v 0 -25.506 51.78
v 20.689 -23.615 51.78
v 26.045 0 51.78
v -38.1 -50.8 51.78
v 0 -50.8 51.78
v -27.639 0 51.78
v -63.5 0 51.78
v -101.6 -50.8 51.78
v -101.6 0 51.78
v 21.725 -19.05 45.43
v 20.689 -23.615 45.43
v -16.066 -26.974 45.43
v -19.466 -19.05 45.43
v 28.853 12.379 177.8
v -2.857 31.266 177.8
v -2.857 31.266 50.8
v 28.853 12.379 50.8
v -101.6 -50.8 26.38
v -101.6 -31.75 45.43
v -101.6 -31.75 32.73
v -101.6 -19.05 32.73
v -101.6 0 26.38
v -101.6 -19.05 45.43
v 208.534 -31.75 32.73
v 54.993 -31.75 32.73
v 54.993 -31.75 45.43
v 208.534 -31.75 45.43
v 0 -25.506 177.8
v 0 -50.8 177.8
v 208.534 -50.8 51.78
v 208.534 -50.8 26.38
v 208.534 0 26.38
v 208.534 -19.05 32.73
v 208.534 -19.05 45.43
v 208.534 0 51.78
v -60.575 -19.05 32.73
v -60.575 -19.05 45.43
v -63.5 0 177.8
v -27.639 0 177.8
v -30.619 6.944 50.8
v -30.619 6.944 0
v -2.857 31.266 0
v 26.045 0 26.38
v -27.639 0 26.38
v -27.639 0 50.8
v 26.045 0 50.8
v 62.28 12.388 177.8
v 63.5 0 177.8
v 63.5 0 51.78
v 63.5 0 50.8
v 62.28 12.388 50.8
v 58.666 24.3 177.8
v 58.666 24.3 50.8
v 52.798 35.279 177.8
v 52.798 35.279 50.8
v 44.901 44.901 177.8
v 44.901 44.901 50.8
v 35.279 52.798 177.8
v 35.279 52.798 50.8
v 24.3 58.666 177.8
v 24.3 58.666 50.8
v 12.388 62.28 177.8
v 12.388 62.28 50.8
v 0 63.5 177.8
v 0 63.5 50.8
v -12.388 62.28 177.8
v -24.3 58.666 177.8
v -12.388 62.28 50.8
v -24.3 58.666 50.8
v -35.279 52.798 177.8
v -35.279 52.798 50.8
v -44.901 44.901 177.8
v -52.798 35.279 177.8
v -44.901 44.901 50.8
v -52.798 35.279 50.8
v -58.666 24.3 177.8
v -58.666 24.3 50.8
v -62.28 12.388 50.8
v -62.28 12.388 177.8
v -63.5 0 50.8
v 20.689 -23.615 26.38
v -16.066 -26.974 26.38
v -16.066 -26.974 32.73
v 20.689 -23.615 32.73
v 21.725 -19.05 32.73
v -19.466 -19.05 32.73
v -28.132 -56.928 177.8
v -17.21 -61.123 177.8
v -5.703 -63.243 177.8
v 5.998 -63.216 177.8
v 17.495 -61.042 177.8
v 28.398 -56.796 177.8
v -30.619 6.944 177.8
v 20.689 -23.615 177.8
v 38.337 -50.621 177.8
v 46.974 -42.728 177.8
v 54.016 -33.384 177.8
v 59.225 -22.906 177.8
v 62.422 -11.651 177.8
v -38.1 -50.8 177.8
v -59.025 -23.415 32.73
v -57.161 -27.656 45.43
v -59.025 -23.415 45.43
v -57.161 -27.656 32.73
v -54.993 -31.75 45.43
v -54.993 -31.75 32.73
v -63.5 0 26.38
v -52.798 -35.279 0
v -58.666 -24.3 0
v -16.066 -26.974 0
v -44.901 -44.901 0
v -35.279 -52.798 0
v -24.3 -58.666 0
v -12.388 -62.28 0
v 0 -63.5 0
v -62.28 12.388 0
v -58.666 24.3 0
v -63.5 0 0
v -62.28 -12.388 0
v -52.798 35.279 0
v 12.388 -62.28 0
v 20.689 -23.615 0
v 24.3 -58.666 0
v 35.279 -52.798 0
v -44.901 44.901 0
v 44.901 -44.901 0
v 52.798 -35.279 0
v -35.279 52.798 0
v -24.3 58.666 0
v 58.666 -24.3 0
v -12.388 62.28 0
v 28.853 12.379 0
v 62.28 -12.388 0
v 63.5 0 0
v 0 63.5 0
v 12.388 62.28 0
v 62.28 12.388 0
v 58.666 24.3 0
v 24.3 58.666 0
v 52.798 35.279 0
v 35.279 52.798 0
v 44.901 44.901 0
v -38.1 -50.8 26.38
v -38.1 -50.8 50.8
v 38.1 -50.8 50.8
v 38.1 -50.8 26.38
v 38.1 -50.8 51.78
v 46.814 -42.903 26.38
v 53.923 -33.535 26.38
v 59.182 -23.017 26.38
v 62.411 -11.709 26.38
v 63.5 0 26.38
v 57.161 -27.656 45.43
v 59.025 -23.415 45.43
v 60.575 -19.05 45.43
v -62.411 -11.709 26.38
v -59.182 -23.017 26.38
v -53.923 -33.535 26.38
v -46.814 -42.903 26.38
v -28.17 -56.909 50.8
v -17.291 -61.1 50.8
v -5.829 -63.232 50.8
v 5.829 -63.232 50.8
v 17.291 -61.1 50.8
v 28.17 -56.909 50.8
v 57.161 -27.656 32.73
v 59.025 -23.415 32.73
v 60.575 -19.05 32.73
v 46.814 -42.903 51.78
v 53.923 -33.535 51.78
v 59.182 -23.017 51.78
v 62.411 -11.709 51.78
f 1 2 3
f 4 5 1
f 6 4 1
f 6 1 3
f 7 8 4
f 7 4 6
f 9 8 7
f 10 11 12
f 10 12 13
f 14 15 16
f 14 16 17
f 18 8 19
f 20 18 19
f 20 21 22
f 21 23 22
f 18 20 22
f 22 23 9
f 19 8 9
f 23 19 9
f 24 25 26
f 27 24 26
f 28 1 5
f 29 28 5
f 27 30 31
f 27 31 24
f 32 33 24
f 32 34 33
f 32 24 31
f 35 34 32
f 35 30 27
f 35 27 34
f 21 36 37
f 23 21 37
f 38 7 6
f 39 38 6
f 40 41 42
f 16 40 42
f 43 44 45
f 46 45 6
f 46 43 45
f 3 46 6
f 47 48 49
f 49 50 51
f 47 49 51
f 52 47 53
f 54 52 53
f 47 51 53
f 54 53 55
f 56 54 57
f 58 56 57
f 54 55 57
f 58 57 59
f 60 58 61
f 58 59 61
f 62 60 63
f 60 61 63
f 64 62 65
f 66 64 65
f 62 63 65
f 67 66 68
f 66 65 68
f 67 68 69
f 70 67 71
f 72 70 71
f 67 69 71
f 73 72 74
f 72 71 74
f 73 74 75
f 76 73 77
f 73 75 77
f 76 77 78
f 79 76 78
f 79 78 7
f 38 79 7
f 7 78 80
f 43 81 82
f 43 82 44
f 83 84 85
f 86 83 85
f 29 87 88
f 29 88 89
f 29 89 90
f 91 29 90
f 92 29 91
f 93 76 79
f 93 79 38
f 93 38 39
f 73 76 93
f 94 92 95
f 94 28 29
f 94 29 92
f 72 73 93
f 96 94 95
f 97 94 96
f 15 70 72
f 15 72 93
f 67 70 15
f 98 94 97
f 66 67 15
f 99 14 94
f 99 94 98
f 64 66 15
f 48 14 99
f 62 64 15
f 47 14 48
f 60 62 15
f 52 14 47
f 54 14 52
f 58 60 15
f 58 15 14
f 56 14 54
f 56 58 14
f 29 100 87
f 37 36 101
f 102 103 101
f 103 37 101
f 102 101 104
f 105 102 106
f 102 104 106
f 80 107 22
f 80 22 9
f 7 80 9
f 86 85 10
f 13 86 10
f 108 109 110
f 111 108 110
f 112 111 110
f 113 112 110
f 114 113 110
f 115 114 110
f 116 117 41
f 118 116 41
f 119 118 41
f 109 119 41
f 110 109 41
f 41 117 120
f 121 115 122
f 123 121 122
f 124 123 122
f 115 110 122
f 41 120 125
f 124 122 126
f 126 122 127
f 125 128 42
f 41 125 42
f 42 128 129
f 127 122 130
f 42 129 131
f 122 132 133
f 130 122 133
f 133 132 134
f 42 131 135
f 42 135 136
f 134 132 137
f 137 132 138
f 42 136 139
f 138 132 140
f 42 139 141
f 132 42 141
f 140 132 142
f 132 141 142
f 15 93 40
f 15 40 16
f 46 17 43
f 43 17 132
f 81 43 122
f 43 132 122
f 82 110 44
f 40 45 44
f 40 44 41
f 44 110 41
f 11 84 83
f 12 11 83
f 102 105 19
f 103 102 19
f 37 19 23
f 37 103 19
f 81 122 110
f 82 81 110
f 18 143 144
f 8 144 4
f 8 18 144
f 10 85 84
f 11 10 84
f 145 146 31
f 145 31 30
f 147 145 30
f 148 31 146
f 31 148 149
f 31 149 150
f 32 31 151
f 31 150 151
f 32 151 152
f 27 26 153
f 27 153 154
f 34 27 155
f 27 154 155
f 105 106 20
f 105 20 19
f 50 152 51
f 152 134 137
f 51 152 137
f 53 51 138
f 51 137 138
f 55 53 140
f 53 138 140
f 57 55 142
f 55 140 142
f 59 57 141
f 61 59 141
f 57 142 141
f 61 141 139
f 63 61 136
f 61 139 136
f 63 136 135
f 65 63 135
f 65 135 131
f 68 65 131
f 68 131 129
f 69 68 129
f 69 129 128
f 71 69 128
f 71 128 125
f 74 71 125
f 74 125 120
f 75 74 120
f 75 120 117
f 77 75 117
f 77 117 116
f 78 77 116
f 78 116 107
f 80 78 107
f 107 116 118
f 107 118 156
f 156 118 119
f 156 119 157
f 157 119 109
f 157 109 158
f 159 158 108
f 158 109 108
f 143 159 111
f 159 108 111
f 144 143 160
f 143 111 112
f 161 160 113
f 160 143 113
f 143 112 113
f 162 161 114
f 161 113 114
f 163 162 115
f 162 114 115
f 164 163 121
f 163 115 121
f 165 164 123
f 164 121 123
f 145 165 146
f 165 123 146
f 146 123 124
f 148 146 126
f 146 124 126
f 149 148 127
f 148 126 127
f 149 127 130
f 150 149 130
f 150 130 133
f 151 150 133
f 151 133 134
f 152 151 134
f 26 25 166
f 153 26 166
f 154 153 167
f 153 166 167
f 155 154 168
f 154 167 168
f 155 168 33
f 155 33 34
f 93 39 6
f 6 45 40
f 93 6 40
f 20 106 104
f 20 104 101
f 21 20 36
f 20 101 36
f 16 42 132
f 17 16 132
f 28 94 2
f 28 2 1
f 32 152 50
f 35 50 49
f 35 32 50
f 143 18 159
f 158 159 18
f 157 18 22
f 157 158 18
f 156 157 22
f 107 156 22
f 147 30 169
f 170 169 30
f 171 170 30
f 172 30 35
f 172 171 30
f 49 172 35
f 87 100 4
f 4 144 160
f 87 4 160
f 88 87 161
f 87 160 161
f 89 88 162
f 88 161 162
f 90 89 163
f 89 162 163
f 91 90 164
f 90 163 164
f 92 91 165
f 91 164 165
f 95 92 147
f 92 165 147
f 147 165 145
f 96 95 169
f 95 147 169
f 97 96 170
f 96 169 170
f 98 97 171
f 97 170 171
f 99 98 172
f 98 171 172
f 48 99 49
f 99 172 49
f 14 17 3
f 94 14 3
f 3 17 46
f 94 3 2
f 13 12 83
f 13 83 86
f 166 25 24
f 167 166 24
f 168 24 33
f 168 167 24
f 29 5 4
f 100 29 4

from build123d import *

# Parameters (mm, degrees)
F0_R     = 63.5
F1_DEPTH = 50.8
F2_W     = 50.8
F2_H     = 25.4
F2_W_2   = 12.7
F2_H_2   = 12.7
F3_DEPTH = 101.6
F5_DEPTH = 208.534
F6_DEPTH = 127


with BuildPart() as f1:
    # F0 (on Top) → F1 (new body)
    with BuildSketch(Plane.XY):
        Circle(F0_R)
        Polygon((-16.065903, -26.974127), (-30.618556, 6.944118), (-2.857406, 31.265828), (28.852582, 12.379227), (20.689283, -23.615045), align=None, mode=Mode.SUBTRACT)
    extrude(amount=F1_DEPTH)

    # F2 (on Right) → F3 (join)
    with BuildSketch(Plane.YZ):
        with Locations((-25.4, 39.080285)):
            Rectangle(F2_W, F2_H)
        with Locations((-25.4, 39.080285)):
            Rectangle(F2_W_2, F2_H_2, mode=Mode.SUBTRACT)
    extrude(amount=-F3_DEPTH)

    # F2 (on Right) → F5 (join)
    with BuildSketch(Plane.YZ):
        with Locations((-25.4, 39.080285)):
            Rectangle(F2_W, F2_H)
        with Locations((-25.4, 39.080285)):
            Rectangle(F2_W_2, F2_H_2, mode=Mode.SUBTRACT)
    extrude(amount=F5_DEPTH)

    # F4 (on face) → F6 (join)
    with BuildSketch(Plane.XY.offset(50.8)):
        with BuildLine():
            Line((0, -50.8), (-38.1, -50.8))
            ThreePointArc((-38.1, -50.8), (28.398063, -56.796127), (63.5, 0))
            ThreePointArc((63.5, 0), (0, 63.5), (-63.5, 0))
            Line((-63.5, 0), (-27.639176, 0))
            Line((-27.639176, 0), (-30.618556, 6.944118))
            Line((-30.618556, 6.944118), (-2.857406, 31.265828))
            Line((-2.857406, 31.265828), (28.852582, 12.379227))
            Line((28.852582, 12.379227), (20.689283, -23.615045))
            Line((20.689283, -23.615045), (0, -25.505853))
            Line((0, -25.505853), (0, -50.8))
        make_face()
    extrude(amount=F6_DEPTH)


solid = f1.part
